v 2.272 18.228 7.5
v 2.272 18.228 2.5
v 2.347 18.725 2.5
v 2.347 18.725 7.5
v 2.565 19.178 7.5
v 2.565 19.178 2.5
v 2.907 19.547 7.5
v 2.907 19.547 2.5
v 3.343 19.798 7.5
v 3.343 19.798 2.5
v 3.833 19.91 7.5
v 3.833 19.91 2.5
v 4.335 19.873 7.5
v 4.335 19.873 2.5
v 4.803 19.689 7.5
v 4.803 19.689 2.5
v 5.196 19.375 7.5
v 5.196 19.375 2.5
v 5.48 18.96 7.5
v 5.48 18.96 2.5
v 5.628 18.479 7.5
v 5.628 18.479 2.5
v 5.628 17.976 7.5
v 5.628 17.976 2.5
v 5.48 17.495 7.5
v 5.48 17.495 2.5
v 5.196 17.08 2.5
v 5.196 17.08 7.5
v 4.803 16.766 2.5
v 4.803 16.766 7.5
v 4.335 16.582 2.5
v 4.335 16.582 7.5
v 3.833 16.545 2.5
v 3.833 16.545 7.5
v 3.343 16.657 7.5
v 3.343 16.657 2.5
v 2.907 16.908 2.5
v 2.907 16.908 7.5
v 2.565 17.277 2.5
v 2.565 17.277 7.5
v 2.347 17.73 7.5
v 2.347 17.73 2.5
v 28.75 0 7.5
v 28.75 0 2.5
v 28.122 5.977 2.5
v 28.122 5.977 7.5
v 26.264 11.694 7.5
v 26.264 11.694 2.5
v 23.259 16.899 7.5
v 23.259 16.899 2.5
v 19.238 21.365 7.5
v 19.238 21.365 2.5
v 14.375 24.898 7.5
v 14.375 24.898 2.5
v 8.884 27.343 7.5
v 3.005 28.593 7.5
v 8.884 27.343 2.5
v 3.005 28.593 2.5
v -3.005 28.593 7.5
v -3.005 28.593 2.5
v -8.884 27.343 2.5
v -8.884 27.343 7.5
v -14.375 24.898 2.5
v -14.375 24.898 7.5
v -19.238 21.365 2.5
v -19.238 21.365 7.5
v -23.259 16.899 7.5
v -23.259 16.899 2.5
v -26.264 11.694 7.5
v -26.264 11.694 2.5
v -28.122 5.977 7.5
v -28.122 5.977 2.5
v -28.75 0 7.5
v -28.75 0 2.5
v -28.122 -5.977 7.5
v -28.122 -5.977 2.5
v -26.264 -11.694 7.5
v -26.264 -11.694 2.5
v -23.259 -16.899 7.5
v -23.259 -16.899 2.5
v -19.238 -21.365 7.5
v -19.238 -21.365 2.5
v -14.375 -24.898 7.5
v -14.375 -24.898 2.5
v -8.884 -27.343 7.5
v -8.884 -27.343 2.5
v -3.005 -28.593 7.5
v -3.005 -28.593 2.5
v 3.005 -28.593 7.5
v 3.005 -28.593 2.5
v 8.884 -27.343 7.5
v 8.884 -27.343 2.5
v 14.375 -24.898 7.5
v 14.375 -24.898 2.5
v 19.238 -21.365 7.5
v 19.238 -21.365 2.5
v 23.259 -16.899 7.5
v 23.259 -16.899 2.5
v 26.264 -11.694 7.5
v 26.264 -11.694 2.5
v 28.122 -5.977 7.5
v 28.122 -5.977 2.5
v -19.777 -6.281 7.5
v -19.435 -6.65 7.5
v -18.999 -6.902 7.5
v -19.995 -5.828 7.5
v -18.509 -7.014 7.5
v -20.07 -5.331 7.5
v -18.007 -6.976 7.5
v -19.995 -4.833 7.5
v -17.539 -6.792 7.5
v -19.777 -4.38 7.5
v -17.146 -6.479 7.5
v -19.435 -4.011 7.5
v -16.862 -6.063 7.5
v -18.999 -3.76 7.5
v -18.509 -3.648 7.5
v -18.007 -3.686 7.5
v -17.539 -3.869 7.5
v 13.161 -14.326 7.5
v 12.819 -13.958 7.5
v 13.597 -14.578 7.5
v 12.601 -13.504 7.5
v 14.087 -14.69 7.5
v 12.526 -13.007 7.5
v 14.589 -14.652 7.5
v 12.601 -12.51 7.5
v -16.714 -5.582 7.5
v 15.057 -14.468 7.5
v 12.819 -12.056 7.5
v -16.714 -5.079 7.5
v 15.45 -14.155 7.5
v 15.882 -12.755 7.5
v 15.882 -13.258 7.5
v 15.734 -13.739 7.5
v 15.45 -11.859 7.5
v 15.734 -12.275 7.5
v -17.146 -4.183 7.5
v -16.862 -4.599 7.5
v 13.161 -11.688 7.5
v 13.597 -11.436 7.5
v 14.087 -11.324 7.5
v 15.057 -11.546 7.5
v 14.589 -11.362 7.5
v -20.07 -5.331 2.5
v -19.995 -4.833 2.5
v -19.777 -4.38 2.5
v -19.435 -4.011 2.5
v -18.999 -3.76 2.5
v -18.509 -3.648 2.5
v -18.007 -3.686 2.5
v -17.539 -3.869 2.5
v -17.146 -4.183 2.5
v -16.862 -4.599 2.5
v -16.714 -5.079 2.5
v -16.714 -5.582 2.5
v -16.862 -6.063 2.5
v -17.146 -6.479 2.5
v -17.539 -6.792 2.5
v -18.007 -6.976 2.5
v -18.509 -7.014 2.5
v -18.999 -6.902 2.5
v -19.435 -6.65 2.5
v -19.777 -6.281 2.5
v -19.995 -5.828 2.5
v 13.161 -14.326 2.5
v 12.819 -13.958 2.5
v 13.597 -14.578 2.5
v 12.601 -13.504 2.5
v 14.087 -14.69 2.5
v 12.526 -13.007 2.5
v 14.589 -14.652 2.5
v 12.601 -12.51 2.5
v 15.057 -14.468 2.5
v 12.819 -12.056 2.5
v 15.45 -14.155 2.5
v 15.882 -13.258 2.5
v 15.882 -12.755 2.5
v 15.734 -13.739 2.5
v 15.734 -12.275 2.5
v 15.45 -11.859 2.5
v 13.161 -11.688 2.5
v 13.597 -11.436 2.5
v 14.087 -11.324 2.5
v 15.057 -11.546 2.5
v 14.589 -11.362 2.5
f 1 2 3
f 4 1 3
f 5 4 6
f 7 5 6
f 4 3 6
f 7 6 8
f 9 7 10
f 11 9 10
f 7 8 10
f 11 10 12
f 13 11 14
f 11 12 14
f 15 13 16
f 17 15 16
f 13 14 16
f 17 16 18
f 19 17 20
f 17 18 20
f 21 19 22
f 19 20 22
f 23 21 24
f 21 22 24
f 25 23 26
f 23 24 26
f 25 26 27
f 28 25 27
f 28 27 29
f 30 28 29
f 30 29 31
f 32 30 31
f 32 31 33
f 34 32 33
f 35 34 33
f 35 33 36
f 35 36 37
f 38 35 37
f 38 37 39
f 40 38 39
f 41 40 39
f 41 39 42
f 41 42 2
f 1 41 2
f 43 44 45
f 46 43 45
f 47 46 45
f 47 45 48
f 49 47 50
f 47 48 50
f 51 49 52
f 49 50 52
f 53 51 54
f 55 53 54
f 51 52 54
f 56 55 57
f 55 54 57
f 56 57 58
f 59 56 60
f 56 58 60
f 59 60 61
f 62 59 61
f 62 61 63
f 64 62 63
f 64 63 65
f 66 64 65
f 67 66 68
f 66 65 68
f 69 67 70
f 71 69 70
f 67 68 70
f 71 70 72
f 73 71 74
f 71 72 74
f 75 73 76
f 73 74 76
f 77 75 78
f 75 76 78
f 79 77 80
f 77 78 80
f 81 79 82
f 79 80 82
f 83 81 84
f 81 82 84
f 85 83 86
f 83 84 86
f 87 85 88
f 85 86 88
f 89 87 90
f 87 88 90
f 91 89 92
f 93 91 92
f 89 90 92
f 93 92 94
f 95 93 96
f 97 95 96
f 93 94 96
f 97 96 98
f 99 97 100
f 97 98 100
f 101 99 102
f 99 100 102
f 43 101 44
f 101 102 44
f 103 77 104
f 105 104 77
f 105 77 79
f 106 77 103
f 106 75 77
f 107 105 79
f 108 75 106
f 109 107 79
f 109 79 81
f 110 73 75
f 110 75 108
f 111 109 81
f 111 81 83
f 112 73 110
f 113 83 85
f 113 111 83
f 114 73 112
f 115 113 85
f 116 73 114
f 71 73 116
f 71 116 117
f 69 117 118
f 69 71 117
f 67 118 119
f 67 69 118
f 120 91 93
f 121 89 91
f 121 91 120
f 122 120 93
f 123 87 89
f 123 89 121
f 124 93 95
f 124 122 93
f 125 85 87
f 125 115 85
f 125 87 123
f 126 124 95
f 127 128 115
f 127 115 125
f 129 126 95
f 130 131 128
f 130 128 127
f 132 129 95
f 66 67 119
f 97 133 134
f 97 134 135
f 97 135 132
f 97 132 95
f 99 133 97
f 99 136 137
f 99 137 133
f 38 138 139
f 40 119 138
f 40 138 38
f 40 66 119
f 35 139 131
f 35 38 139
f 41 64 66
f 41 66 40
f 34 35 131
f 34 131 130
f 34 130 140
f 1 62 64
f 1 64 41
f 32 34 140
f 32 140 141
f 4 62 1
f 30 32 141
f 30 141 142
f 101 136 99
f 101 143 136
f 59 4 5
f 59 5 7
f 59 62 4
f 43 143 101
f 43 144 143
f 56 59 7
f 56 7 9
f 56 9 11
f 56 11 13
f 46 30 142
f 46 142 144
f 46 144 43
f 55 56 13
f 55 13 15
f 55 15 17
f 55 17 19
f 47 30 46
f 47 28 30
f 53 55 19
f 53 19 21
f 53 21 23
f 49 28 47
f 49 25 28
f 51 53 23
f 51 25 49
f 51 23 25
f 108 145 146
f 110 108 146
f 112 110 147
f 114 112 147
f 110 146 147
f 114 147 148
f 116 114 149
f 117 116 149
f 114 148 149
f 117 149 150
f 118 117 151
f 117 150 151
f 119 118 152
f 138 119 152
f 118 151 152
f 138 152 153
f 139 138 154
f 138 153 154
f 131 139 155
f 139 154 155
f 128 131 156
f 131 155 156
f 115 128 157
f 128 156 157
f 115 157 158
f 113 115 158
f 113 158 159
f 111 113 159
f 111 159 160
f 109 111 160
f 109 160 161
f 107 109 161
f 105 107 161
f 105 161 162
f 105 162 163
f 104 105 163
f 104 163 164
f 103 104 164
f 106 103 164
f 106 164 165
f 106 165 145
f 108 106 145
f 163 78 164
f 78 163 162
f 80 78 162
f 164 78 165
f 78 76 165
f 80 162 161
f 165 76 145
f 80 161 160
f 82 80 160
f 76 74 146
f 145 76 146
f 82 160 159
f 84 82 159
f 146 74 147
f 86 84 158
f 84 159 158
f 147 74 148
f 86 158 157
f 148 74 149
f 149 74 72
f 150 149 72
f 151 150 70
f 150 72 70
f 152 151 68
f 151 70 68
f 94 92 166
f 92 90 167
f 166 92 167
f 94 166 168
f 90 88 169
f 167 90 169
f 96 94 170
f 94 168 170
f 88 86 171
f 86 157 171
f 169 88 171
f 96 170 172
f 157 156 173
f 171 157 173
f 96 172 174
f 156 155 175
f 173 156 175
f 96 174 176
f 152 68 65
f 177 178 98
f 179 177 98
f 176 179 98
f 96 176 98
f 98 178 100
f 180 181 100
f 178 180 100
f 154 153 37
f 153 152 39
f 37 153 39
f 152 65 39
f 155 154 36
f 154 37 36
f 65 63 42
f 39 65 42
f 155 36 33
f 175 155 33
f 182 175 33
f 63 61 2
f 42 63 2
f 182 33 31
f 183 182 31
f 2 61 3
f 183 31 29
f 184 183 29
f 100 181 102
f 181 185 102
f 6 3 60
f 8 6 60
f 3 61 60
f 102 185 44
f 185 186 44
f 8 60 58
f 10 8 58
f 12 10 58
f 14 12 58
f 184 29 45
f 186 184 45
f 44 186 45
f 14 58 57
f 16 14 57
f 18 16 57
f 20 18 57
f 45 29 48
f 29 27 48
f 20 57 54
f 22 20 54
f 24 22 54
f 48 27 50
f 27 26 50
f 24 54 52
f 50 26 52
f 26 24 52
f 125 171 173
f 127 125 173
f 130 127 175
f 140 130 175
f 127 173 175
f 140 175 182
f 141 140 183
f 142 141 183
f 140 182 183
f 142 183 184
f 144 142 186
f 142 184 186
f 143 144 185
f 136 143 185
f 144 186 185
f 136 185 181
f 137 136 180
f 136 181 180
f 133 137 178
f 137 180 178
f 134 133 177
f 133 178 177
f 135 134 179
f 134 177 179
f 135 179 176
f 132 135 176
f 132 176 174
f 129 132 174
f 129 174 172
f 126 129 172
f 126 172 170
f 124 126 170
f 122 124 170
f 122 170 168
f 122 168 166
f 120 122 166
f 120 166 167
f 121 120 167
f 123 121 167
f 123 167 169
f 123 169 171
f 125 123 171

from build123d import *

# Parameters (mm, degrees)
ESQUISSE1_R             = 57.5
BOSS_EXTRU_1_DEPTH      = 10
ECHELLE1_SCALE          = 2
ECHELLE2_SCALE          = 0.25
ESQUISSE2_R             = 1.6875
ENL_V_MAT_EXTRU_1_DEPTH = 10


with BuildPart() as part:
    # Esquisse1 → Boss.-Extru.1 (new body)
    with BuildSketch(Plane.XY):
        Circle(ESQUISSE1_R)
    extrude(amount=BOSS_EXTRU_1_DEPTH)


with BuildPart() as part_1:
    # Echelle1: scaled about (0, 0, 5)
    add(part.part.scale(ECHELLE1_SCALE).moved(Location((0, 0, -5))))


with BuildPart() as part_2:
    # Echelle2: scaled about (0, 0, 5)
    add(part_1.part.scale(ECHELLE2_SCALE).moved(Location((0, 0, 3.75))))

    # Esquisse2 → Enlèv. mat.-Extru.1 (cut)
    with BuildSketch(Plane(origin=(0, 0, 2.5), x_dir=(-1, 0, 0), z_dir=(0, 0, -1))):
        with Locations((-3.959214709, 18.22761283)):
            Circle(ESQUISSE2_R)
        with Locations((18.38283853, -5.330774337)):
            Circle(ESQUISSE2_R)
        with Locations((-14.213467184, -13.006989818)):
            Circle(ESQUISSE2_R)
    extrude(amount=-ENL_V_MAT_EXTRU_1_DEPTH, mode=Mode.SUBTRACT)


solid = part_2.part
